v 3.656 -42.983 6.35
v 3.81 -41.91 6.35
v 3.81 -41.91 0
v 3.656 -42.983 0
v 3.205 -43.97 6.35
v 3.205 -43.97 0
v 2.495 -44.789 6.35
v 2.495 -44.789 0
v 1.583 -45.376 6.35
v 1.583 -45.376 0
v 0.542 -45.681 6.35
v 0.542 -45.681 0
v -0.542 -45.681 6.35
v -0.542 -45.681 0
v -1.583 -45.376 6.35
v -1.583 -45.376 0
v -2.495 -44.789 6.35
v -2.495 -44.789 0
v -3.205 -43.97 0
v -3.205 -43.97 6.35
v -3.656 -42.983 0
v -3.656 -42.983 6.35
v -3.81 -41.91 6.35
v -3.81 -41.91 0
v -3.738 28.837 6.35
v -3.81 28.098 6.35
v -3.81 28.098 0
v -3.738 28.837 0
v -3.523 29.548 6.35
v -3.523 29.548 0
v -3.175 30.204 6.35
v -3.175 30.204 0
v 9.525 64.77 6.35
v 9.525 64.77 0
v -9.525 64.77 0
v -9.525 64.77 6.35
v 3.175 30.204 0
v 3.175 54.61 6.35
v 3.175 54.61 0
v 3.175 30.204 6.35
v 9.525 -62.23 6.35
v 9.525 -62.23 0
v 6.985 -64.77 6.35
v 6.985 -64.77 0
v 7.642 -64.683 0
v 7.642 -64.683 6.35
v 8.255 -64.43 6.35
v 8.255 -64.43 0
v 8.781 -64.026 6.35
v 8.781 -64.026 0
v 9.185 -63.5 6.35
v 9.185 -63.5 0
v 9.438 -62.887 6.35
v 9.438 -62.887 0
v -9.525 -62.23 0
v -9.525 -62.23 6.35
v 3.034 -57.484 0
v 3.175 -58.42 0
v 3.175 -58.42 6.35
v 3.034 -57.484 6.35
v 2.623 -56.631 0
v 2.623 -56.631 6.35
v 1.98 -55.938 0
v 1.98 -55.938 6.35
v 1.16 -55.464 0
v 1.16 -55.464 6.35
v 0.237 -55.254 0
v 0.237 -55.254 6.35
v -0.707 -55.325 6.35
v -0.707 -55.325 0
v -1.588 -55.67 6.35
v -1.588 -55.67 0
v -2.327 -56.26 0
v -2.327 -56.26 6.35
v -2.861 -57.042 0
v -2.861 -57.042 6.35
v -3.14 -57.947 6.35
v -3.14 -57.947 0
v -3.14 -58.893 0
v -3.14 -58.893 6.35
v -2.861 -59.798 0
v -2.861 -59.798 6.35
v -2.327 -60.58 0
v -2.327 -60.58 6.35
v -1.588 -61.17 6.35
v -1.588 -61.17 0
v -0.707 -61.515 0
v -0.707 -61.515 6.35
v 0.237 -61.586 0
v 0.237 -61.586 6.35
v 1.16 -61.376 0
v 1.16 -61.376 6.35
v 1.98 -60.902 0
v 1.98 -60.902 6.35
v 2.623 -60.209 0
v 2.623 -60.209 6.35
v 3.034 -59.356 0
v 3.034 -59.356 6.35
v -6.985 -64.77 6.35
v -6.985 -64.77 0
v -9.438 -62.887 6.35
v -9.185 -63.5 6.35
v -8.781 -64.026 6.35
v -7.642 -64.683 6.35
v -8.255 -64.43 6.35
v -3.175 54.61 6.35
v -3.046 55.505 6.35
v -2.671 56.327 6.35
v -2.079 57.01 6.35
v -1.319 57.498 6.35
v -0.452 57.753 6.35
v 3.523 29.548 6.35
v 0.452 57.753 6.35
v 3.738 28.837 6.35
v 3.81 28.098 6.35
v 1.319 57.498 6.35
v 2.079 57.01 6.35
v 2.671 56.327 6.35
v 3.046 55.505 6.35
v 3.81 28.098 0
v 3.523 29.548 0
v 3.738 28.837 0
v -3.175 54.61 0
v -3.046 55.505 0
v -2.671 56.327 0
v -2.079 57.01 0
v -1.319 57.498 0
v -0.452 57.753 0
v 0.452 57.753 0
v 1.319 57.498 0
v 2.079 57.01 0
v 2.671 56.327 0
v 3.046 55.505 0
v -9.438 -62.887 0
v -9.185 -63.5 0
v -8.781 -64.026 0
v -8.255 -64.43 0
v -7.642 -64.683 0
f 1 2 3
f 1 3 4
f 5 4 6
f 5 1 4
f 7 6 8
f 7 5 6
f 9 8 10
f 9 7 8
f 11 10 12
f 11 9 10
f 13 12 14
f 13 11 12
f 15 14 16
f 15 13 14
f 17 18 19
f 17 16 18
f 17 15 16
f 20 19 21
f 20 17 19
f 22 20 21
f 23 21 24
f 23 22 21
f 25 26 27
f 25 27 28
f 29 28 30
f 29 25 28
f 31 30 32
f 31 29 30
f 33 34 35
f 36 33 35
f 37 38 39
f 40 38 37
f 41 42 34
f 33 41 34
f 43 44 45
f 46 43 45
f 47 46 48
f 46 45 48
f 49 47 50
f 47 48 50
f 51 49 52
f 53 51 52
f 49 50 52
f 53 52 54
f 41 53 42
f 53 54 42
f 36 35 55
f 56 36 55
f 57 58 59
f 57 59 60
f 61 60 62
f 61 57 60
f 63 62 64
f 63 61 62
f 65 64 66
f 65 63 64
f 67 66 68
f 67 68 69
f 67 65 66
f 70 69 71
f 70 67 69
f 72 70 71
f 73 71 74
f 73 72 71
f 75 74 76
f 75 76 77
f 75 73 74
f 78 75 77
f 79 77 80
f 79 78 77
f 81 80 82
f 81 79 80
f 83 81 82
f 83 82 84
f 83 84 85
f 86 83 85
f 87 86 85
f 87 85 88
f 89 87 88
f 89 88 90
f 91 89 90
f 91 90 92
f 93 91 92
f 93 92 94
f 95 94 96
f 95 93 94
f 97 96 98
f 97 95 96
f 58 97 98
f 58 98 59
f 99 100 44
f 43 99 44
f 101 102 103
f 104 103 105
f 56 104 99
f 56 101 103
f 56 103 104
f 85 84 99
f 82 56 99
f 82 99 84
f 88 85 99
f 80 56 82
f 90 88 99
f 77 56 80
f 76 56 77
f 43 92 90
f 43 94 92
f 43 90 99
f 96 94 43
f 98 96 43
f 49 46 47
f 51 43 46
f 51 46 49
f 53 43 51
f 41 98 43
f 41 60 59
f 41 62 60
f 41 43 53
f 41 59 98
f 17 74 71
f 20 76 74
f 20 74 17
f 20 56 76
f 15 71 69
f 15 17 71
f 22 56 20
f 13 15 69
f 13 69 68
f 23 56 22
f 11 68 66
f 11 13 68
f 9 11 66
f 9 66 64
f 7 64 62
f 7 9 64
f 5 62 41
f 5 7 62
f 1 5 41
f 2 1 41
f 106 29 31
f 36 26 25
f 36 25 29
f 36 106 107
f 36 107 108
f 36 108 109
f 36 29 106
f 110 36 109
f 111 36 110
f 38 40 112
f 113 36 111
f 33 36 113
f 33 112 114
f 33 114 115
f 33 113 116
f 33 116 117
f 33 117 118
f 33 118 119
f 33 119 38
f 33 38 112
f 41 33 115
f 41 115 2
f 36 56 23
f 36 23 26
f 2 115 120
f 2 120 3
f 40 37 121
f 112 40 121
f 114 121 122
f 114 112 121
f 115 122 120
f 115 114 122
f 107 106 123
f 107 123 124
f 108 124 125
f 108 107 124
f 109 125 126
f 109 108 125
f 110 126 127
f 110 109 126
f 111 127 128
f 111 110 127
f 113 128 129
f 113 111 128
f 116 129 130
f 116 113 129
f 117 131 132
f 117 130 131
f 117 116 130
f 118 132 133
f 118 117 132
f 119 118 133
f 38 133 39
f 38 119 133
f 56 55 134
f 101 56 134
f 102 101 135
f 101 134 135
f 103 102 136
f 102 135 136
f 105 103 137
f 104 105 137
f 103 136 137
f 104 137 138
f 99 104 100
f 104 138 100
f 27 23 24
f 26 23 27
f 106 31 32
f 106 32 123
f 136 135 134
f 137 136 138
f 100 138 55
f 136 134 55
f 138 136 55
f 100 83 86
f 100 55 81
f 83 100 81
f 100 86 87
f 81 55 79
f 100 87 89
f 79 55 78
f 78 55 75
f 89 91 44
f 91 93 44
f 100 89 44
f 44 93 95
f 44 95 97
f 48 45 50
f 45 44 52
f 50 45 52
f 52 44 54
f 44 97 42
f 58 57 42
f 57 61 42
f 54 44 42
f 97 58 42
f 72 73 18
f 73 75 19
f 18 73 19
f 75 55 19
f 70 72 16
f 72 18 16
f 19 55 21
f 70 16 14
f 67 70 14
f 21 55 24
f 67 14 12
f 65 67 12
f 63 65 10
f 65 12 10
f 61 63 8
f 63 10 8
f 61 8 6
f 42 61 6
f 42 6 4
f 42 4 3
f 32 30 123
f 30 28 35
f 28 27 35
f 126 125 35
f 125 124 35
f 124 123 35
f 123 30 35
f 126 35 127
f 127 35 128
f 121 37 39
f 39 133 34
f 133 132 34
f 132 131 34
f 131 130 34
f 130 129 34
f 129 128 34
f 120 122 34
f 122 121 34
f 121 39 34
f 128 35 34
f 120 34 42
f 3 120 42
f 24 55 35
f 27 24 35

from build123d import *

# Parameters (mm, degrees)
SKETCH1_R               = 3.175
BOSS_EXTRUDE1_DEPTH     = 6.35
CUT_EXTRUDE1_DEPTH      = 1
CUT_EXTRUDE1_DEPTH_BACK = 7.35
CUT_EXTRUDE2_DEPTH      = 7.35


with BuildPart() as part:
    # Sketch1 → Boss-Extrude1 (new body)
    with BuildSketch(Plane.XY):
        with BuildLine():
            Line((-6.985, -64.77), (6.985, -64.77))
            ThreePointArc((6.985, -64.77), (8.781051224, -64.026051224), (9.525, -62.23))
            Line((9.525, -62.23), (9.525, 64.77))
            Line((9.525, 64.77), (-9.525, 64.77))
            Line((-9.525, 64.77), (-9.525, -62.23))
            ThreePointArc((-9.525, -62.23), (-8.781051224, -64.026051224), (-6.985, -64.77))
        make_face()
        with Locations((0, -58.42)):
            Circle(SKETCH1_R, mode=Mode.SUBTRACT)
    extrude(amount=BOSS_EXTRUDE1_DEPTH)

    # Sketch2 → Cut-Extrude1 (cut, two sides)
    with BuildSketch(Plane.XY.offset(6.35)) as cut_extrude1_sk:
        with BuildLine():
            Line((-3.175, -41.91), (-3.175, 54.61))
            ThreePointArc((-3.175, 54.61), (0, 57.785), (3.175, 54.61))
            Line((3.175, 54.61), (3.175, -41.91))
            ThreePointArc((3.175, -41.91), (0, -45.085), (-3.175, -41.91))
        make_face()
    extrude(amount=CUT_EXTRUDE1_DEPTH, mode=Mode.SUBTRACT)
    extrude(cut_extrude1_sk.sketch, amount=-CUT_EXTRUDE1_DEPTH_BACK, mode=Mode.SUBTRACT)

    # Sketch3 → Cut-Extrude2 (cut, through all)
    with BuildSketch(Plane.XY.offset(6.35)):
        with BuildLine():
            Line((3.81, 28.098134356), (3.81, -41.91))
            ThreePointArc((3.81, -41.91), (0, -45.72), (-3.81, -41.91))
            Line((-3.81, -41.91), (-3.81, 28.098134356))
            ThreePointArc((-3.81, 28.098134356), (0, 31.908134356), (3.81, 28.098134356))
        make_face()
    extrude(amount=-CUT_EXTRUDE2_DEPTH, mode=Mode.SUBTRACT)


solid = part.part
